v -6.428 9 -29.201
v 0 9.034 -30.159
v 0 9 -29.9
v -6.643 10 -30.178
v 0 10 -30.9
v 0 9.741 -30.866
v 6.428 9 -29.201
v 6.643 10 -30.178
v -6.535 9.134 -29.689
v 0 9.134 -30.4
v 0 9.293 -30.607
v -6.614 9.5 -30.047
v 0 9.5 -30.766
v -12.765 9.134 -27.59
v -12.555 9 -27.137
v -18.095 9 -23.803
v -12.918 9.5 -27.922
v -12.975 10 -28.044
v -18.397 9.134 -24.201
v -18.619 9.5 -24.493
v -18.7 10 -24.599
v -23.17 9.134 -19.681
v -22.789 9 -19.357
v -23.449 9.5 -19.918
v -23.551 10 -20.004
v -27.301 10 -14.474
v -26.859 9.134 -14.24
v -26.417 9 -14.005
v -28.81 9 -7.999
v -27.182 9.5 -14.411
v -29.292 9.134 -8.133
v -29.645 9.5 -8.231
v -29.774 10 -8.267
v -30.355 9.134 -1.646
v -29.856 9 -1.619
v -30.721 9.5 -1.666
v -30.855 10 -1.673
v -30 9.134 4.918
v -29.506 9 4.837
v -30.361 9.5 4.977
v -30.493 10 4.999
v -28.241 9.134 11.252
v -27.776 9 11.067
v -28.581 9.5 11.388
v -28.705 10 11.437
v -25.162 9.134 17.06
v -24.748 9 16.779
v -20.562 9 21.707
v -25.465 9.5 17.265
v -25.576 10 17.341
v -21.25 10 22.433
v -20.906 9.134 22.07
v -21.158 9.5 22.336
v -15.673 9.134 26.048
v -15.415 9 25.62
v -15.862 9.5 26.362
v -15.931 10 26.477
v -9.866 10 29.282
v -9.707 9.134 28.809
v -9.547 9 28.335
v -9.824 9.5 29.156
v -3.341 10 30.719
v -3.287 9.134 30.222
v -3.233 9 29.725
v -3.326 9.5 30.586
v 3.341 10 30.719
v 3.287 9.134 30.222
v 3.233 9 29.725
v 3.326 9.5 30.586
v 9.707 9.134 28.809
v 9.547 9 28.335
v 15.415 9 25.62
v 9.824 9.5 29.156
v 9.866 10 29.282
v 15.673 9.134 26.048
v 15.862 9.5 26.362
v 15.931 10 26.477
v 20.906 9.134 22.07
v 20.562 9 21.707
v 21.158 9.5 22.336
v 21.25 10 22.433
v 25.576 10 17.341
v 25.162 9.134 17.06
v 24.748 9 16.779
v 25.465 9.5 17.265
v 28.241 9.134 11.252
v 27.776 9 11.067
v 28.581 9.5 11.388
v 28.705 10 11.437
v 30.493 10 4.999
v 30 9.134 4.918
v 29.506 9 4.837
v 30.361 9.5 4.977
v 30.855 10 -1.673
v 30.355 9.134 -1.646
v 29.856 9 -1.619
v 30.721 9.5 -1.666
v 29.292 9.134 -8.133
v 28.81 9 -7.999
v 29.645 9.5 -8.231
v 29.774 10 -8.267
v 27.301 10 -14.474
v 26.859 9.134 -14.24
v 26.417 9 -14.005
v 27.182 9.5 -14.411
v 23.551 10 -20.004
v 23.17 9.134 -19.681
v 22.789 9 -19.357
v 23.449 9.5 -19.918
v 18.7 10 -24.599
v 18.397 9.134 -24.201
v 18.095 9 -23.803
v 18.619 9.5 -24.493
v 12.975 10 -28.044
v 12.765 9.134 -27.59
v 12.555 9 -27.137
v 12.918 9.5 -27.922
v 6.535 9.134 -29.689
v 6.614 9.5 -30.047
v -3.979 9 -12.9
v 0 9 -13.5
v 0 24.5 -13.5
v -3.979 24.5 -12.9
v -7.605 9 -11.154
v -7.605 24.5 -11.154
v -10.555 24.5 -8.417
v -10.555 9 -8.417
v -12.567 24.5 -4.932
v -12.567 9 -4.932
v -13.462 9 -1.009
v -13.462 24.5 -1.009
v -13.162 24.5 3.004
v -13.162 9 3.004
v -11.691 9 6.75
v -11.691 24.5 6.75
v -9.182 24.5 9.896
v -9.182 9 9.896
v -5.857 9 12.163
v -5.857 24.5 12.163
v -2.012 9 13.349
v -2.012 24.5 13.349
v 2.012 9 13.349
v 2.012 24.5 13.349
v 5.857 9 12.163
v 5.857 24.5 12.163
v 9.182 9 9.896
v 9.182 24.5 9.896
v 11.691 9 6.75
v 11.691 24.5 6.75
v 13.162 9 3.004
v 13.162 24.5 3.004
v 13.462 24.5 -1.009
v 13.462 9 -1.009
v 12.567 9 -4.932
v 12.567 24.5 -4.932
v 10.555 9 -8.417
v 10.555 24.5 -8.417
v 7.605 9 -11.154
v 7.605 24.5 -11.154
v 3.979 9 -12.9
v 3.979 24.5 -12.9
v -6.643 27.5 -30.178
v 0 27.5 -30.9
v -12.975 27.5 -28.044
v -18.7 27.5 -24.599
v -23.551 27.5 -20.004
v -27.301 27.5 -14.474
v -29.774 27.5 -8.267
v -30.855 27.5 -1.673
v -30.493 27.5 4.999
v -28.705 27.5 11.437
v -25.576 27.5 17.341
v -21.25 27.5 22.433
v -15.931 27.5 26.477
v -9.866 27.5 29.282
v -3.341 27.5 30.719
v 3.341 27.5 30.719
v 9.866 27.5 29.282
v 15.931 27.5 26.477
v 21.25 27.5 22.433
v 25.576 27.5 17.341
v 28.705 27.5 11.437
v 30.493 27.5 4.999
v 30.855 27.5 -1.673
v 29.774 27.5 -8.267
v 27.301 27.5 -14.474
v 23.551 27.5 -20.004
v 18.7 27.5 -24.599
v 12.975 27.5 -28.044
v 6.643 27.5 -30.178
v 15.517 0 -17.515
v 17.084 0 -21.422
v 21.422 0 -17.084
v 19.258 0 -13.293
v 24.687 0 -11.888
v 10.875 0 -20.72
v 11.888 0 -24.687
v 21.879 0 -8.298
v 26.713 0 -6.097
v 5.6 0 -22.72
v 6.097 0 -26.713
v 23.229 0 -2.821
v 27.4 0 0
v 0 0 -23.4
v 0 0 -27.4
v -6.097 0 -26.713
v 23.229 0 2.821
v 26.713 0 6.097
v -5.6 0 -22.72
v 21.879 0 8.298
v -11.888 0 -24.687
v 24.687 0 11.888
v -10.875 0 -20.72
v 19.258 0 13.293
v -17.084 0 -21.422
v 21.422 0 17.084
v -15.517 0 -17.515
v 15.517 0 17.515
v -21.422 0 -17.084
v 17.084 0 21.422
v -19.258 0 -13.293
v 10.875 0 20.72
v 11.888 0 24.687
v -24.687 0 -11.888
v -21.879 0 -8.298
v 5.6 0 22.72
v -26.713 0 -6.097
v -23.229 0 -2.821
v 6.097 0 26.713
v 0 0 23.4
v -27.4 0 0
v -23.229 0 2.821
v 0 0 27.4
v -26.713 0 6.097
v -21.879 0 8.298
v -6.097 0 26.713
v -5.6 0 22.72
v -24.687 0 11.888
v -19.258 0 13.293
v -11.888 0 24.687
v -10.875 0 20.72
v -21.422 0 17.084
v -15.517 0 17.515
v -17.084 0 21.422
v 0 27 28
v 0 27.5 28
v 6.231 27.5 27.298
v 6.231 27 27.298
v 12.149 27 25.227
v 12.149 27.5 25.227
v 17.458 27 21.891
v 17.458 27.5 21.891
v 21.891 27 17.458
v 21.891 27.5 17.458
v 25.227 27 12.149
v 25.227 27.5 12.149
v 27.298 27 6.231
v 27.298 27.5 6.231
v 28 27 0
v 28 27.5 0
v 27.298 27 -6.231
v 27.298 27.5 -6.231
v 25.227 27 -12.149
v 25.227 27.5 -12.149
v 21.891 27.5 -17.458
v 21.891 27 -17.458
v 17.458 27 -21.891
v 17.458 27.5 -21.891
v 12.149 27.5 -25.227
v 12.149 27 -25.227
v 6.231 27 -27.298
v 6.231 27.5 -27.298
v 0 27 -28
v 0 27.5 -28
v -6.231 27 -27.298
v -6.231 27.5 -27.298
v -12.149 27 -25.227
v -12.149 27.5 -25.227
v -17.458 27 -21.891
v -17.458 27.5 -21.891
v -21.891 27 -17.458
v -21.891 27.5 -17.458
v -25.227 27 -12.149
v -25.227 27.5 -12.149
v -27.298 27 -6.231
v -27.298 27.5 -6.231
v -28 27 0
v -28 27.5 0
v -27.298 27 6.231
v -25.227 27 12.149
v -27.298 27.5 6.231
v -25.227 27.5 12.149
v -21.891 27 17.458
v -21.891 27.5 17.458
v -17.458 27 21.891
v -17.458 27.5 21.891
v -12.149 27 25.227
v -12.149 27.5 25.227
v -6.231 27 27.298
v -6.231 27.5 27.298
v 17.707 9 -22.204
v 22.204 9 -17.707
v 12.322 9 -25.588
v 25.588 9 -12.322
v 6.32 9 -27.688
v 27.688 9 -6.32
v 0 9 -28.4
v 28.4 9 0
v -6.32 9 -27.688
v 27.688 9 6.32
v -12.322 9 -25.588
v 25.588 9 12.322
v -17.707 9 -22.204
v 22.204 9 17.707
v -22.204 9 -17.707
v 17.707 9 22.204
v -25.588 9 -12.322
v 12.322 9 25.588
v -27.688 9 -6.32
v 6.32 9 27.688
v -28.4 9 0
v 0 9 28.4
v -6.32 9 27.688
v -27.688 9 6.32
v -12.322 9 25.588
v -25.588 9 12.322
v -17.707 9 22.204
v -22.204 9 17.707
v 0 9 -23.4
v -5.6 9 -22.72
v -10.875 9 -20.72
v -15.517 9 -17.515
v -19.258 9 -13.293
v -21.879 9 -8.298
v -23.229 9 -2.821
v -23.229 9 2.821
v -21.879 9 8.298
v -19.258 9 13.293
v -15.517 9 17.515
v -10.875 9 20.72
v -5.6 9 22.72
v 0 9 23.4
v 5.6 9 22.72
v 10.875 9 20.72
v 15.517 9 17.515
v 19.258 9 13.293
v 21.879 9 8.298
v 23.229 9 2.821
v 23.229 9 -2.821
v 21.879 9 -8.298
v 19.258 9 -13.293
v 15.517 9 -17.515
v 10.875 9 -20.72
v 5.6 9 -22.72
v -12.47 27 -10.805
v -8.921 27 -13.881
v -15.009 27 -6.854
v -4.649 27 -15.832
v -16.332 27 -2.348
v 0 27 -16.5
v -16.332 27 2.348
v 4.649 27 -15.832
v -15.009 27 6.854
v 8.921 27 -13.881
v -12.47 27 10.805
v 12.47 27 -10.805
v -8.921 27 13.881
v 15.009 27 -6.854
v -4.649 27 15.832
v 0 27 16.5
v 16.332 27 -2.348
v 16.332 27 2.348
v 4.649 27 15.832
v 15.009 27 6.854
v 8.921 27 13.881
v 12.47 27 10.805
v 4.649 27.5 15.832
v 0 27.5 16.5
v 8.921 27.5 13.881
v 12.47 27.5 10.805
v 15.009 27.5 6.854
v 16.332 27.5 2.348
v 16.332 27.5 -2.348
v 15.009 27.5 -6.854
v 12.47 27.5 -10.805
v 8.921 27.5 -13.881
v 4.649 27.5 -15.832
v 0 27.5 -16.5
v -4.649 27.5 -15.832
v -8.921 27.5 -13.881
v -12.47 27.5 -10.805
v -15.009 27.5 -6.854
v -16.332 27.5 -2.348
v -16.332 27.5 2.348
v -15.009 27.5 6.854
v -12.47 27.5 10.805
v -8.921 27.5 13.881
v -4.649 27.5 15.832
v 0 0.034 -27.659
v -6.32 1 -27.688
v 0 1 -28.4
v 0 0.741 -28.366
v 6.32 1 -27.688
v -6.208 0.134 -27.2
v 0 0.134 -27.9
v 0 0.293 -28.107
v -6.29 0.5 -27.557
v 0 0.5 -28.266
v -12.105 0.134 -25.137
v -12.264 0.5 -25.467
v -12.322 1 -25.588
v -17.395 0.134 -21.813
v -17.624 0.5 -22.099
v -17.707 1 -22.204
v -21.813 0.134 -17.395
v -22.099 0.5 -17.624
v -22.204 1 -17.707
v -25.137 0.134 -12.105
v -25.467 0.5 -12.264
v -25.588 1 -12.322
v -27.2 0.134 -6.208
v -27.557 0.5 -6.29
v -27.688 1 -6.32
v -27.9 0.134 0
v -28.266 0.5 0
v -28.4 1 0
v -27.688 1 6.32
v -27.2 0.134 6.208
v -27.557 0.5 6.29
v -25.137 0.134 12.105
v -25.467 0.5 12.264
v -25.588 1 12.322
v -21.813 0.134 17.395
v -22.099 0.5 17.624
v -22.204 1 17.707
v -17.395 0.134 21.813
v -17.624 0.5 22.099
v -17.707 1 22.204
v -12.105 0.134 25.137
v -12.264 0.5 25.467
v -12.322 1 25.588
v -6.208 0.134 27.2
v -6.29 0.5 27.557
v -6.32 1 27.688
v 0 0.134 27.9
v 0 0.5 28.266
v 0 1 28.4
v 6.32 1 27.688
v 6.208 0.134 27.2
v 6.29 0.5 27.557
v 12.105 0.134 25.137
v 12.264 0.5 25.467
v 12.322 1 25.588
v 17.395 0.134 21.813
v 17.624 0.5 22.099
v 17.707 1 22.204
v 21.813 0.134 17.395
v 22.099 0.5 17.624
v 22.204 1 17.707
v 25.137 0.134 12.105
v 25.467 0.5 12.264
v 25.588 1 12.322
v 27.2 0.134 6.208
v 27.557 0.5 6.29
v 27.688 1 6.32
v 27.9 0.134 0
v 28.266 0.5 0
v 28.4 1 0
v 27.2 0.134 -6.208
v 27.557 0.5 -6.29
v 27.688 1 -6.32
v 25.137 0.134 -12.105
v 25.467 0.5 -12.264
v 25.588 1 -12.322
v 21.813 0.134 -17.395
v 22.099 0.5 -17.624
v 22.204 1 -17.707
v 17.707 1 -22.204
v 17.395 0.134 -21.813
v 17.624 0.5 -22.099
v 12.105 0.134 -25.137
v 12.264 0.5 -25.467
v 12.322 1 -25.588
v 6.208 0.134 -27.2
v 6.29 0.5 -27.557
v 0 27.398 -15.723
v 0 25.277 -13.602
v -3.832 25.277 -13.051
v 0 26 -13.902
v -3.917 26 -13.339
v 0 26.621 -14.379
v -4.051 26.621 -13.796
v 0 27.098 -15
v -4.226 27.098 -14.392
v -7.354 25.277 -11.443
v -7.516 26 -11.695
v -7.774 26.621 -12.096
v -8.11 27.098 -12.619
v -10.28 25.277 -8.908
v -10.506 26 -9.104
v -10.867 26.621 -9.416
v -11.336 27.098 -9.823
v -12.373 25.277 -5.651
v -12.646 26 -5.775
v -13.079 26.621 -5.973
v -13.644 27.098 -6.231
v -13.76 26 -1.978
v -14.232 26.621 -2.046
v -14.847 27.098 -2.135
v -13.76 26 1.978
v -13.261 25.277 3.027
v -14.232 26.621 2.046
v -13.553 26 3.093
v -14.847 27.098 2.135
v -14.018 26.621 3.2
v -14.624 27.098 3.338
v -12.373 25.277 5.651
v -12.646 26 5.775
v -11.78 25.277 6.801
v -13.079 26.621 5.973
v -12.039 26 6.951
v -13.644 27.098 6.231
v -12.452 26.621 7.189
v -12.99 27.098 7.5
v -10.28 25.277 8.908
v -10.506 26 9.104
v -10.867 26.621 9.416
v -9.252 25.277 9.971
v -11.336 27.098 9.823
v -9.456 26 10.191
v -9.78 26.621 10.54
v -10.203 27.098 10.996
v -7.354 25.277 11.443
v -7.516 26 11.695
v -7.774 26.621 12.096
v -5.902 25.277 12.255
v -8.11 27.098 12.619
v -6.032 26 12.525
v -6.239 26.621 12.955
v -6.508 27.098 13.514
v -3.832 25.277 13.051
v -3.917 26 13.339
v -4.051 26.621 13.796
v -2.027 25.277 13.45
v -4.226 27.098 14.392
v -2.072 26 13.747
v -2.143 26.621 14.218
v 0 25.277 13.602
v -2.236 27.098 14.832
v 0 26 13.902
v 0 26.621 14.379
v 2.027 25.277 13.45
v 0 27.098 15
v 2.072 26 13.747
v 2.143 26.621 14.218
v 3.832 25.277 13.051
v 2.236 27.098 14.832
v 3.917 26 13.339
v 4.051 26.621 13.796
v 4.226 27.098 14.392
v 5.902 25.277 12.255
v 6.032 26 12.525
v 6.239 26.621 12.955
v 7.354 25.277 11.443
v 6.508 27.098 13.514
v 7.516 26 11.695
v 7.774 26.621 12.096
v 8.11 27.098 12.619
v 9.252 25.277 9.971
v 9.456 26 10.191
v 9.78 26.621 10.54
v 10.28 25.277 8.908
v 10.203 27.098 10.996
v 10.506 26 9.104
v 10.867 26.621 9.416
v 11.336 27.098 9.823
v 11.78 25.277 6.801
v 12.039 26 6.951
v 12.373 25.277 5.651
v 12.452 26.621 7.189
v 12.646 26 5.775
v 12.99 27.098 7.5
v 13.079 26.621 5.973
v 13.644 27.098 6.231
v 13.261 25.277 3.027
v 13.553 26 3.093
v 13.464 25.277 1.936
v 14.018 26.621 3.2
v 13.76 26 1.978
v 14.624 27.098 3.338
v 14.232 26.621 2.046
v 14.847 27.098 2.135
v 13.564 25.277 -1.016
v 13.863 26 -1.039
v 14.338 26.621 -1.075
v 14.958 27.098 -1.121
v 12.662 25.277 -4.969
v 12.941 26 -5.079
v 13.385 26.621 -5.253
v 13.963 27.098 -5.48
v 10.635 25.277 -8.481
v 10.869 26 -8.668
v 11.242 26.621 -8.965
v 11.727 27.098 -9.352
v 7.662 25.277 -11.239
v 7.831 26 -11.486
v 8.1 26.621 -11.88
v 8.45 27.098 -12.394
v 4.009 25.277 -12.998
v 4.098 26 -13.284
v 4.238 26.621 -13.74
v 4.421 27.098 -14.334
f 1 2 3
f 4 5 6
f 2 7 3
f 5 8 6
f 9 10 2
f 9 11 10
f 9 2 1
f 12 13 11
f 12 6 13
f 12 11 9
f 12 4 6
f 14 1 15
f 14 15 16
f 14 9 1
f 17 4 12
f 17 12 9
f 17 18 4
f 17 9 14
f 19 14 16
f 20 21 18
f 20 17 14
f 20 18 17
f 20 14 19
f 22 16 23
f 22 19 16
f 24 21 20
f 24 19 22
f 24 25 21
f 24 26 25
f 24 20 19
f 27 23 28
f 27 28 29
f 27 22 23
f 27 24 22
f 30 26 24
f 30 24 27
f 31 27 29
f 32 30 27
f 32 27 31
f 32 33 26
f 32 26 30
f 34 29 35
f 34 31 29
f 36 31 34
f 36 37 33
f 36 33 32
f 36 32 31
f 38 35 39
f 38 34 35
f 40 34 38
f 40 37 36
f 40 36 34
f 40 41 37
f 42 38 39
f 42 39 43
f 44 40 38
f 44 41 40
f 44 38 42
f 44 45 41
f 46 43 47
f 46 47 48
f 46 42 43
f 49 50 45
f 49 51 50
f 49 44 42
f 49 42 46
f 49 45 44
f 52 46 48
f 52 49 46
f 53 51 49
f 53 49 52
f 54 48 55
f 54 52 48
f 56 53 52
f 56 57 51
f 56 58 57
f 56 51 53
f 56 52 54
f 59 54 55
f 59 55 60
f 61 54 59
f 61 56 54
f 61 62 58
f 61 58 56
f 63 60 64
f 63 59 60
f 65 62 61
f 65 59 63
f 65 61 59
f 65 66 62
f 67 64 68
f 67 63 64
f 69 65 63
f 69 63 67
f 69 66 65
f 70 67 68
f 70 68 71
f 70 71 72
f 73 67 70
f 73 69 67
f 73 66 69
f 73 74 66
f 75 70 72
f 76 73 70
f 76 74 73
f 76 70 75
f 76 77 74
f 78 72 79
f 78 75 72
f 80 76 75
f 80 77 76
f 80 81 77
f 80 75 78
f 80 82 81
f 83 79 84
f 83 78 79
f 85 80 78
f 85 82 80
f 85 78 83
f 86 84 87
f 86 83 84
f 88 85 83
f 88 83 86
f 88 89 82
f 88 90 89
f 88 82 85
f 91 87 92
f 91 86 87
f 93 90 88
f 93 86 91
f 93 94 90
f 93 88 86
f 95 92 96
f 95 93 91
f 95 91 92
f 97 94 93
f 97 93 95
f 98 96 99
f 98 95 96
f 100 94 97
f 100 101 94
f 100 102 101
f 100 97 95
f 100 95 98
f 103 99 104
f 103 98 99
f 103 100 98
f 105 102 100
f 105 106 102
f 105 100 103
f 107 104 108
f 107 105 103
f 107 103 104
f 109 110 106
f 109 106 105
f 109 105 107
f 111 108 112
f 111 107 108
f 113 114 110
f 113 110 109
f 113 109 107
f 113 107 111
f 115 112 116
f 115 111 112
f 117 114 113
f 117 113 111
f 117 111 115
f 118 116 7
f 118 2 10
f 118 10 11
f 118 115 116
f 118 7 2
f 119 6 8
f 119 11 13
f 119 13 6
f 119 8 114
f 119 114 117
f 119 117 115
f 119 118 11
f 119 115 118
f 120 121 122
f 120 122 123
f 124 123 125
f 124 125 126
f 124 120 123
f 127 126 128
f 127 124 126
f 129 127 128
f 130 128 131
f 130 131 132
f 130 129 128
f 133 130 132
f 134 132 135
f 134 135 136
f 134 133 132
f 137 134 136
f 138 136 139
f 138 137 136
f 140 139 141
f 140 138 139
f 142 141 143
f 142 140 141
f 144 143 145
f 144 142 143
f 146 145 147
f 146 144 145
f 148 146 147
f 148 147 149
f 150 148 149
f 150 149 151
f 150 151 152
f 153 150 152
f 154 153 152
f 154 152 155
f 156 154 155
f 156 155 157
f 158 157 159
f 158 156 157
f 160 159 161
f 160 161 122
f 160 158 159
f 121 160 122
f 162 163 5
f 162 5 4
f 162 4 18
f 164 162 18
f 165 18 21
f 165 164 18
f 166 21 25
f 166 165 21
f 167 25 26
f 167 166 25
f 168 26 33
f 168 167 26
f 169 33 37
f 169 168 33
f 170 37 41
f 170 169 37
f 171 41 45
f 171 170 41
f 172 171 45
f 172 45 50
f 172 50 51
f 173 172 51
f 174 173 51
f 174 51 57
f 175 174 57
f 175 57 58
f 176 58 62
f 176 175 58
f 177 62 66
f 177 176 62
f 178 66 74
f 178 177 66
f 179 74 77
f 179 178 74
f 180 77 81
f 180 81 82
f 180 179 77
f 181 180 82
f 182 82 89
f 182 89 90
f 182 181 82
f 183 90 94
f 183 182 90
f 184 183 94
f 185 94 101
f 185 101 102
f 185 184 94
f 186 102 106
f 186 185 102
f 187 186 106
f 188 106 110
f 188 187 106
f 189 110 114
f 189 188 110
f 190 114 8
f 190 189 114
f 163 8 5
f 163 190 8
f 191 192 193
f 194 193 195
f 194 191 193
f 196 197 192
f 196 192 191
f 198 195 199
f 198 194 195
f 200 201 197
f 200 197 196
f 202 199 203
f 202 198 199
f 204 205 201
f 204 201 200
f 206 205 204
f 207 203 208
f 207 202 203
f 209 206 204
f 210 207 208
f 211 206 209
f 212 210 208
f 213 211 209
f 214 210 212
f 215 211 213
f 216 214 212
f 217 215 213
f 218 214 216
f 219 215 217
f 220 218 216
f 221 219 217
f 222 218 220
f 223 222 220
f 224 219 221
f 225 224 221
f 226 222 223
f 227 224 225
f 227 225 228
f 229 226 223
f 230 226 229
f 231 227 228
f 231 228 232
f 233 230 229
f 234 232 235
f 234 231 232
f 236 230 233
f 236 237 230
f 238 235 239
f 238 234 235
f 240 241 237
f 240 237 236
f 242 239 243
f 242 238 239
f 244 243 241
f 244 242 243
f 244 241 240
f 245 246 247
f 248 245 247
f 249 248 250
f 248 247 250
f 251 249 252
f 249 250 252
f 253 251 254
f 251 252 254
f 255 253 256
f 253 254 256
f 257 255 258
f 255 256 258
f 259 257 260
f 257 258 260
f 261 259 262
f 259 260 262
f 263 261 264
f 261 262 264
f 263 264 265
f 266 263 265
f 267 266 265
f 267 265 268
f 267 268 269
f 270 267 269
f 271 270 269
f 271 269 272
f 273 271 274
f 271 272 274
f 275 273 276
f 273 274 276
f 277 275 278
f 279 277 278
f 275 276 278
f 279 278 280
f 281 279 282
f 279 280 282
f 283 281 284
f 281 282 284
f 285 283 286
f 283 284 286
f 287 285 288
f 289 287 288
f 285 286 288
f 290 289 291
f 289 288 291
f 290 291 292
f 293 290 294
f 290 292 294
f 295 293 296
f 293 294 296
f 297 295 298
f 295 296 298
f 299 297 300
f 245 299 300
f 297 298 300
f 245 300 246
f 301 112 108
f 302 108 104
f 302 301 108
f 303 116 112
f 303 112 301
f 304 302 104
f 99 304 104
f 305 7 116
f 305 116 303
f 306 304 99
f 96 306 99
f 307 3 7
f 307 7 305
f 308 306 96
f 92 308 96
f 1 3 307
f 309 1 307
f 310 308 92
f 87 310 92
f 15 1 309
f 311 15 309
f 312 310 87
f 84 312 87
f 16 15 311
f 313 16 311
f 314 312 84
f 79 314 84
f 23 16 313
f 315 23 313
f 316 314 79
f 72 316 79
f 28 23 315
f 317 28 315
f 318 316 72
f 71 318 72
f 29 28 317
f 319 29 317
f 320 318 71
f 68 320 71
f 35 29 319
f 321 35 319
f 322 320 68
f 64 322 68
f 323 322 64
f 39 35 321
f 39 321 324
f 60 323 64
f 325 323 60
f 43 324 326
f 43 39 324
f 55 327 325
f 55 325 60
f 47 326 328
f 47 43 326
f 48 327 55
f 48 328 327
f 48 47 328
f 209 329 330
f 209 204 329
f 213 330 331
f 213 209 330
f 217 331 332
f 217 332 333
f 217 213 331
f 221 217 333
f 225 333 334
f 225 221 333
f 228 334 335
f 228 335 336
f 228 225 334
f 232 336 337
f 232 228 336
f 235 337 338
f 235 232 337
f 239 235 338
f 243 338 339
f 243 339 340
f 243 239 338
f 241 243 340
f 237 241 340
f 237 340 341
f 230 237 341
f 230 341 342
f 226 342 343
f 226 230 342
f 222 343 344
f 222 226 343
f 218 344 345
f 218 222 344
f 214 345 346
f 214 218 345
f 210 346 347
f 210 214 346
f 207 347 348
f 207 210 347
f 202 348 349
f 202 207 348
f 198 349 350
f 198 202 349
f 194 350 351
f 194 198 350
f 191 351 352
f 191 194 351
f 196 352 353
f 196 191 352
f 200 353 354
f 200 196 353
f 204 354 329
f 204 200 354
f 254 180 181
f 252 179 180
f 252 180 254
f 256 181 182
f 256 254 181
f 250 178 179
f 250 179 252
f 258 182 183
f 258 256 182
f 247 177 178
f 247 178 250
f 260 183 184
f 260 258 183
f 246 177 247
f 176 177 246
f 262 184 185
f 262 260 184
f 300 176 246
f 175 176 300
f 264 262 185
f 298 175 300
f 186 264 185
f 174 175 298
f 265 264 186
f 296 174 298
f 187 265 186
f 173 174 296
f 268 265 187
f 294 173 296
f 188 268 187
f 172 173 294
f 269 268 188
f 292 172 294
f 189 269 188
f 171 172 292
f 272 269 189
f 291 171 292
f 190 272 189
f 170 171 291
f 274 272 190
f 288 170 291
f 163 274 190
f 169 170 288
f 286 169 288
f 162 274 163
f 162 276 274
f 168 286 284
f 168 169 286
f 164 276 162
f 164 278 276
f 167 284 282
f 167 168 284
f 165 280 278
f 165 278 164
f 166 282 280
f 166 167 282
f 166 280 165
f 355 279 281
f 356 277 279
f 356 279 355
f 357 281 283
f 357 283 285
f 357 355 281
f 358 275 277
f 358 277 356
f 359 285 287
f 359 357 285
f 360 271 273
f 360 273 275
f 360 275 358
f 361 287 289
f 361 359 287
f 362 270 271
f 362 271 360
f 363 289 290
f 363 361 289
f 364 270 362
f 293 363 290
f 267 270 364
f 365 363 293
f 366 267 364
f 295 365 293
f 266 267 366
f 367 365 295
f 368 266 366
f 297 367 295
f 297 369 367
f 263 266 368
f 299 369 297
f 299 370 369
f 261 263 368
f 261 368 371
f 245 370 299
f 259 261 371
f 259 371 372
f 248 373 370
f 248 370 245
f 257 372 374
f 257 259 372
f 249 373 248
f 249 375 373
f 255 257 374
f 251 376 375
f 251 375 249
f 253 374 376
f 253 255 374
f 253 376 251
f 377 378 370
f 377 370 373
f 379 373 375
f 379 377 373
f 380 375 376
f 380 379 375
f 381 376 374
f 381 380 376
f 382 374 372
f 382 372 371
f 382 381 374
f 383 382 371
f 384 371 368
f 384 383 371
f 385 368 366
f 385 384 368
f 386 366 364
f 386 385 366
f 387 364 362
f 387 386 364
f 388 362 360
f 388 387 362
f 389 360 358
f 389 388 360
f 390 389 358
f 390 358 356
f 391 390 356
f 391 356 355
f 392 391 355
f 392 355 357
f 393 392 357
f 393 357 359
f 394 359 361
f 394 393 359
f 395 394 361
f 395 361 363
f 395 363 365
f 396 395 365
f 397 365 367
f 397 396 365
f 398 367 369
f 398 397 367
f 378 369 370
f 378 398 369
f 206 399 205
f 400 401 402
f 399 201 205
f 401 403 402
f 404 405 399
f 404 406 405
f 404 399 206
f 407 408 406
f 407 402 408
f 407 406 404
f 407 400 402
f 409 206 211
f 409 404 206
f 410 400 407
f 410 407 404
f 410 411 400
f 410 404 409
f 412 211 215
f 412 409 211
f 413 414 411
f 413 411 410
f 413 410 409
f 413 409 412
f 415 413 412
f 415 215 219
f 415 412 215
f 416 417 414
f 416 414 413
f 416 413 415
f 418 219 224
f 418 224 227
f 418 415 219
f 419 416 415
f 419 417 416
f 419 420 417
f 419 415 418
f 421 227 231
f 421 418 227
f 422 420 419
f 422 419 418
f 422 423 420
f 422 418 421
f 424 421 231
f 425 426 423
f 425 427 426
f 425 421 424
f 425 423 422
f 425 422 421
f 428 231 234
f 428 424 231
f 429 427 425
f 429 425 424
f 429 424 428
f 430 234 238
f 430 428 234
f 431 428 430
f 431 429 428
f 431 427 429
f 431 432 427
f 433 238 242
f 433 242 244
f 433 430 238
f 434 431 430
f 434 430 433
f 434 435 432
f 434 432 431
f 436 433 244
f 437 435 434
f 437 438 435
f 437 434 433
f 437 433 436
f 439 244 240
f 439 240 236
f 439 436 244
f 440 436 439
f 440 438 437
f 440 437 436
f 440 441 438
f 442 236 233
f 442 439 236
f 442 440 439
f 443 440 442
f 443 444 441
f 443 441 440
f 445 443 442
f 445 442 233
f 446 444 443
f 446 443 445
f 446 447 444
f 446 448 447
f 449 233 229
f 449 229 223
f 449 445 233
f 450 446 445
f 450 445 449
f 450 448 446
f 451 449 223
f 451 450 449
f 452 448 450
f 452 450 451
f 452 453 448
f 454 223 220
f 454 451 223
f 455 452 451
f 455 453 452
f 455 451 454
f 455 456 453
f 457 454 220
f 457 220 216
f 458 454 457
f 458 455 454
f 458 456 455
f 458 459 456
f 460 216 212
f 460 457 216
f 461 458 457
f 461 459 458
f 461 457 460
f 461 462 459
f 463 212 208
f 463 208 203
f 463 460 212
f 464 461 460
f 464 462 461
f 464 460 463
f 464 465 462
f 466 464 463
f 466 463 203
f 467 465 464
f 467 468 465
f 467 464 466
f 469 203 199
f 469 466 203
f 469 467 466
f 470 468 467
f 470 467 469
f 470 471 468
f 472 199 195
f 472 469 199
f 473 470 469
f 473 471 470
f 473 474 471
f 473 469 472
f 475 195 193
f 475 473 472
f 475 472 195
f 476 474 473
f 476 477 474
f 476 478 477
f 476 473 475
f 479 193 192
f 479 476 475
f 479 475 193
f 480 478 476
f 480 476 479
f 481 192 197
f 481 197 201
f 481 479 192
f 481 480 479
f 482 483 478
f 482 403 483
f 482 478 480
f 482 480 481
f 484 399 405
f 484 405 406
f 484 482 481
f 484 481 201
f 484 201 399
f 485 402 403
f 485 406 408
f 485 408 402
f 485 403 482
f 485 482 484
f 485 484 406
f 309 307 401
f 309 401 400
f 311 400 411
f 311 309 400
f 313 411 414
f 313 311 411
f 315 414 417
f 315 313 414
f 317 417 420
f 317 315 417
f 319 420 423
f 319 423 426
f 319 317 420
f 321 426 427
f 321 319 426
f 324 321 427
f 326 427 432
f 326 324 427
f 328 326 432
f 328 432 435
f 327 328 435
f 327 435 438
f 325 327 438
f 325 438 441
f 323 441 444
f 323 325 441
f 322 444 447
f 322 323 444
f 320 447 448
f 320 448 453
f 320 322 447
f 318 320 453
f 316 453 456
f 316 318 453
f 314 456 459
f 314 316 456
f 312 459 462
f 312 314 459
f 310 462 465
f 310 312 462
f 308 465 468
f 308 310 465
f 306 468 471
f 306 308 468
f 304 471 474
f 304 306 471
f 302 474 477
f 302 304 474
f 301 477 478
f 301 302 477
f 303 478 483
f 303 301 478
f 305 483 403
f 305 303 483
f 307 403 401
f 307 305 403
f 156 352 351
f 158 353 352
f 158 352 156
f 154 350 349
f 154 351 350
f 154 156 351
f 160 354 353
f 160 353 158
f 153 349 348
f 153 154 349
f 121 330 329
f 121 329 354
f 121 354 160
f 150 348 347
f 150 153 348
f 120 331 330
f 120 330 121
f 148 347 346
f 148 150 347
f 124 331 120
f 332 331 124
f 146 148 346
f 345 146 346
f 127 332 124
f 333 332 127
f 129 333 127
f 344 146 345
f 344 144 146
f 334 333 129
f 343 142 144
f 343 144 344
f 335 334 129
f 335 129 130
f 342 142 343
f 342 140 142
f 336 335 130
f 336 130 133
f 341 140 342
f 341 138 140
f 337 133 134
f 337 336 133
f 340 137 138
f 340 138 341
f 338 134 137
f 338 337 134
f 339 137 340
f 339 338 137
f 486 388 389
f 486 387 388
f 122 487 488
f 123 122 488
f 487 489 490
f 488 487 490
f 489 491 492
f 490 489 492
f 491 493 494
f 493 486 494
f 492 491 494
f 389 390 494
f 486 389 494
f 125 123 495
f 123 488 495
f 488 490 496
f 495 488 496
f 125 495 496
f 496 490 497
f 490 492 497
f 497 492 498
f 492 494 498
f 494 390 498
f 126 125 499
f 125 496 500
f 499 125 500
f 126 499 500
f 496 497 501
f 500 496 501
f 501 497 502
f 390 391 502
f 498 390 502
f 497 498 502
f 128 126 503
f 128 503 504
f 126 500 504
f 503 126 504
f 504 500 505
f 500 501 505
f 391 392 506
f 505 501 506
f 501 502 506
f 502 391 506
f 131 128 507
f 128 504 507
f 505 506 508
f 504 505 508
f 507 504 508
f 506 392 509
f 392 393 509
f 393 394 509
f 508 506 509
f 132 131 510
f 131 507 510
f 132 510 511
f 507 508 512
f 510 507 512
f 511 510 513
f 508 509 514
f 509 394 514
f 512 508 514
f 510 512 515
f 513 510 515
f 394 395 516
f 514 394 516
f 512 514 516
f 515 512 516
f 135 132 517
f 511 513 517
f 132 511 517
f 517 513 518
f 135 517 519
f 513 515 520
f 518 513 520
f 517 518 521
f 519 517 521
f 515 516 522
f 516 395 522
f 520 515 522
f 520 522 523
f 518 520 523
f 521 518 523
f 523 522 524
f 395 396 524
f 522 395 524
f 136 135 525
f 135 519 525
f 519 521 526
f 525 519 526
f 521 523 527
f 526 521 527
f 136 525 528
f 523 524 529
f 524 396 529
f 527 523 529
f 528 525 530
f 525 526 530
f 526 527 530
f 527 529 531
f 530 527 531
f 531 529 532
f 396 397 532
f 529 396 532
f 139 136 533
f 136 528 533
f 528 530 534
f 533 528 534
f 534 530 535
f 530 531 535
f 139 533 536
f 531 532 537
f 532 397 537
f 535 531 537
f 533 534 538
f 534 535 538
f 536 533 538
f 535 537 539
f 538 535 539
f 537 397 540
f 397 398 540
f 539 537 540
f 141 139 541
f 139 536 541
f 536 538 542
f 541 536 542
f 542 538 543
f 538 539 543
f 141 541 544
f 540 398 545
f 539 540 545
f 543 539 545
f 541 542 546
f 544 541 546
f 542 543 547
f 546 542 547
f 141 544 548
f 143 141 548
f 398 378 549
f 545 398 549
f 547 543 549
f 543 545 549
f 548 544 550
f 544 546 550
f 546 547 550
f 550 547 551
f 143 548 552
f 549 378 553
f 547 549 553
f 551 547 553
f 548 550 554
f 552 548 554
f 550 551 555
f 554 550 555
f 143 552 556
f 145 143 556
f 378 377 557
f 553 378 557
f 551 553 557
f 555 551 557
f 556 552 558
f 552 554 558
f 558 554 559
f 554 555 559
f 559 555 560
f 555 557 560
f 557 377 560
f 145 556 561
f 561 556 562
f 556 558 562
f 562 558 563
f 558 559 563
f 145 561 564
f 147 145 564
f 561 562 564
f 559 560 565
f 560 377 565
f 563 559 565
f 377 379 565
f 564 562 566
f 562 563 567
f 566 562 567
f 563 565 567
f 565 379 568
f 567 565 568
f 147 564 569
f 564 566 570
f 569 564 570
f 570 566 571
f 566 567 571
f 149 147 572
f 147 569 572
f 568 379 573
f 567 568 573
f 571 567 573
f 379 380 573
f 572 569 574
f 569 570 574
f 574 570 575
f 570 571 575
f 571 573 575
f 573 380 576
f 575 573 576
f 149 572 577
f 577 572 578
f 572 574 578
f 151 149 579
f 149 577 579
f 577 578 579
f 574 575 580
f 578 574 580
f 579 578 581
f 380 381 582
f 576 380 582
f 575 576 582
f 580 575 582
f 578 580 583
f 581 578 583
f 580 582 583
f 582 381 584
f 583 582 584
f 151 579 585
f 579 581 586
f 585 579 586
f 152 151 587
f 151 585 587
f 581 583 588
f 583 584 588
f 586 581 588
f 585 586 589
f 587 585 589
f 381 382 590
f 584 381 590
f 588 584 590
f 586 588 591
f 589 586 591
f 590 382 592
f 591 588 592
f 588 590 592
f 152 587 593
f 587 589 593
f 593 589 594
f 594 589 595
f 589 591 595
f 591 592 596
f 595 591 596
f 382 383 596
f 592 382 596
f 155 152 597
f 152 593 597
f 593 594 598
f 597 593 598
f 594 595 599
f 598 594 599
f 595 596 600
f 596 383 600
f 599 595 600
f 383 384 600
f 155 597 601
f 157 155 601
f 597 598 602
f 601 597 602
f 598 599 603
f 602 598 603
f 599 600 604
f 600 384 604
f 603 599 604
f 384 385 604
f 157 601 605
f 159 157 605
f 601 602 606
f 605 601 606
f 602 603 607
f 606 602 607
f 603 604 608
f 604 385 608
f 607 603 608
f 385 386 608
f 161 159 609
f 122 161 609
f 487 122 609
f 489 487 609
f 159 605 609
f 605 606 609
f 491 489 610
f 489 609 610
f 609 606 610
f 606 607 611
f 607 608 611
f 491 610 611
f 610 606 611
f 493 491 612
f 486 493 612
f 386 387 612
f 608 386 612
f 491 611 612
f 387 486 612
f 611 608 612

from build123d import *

# Parameters (mm, degrees)
FILLET_1_R          = 1
SKETCH_4_R          = 28
SKETCH_4_R_2        = 16.5
CUT_EXTRUDE_1_DEPTH = 0.5
FILLET_2_R          = 3


with BuildPart() as part:
    # Эскиз3 → Повернуть2 (revolve)
    with BuildSketch(Plane.XY, mode=Mode.PRIVATE) as revolve_2_sk:
        Polygon((23.4, 0), (28.4, 0), (28.4, 9), (30.9, 9), (30.9, 27.5), (13.5, 27.5), (13.5, 9), (23.4, 9), align=None)
    revolve(revolve_2_sk.sketch.rotate(Axis((0, 0, 0), (0, 1, 0)), 90), axis=Axis((0, 0, 0), (0, 1, 0)))

    # Скругление1
    fillet_1_edges = [part.edges().sort_by_distance(p)[0] for p in [
        (0, 9, 30.9),
        (0, 0, 28.4),
    ]]
    fillet(fillet_1_edges, radius=FILLET_1_R)

    # Эскиз4 → Вырез-Вытянуть1 (cut)
    with BuildSketch(Plane(origin=(0, 27.5, 0), x_dir=(1, 0, 0), z_dir=(0, 1, 0))):
        with Locations(Location((0, 0, 0), (0, 0, 270))):
            Circle(SKETCH_4_R)
        with Locations(Location((0, 0, 0), (0, 0, 270))):
            Circle(SKETCH_4_R_2, mode=Mode.SUBTRACT)
    extrude(amount=-CUT_EXTRUDE_1_DEPTH, mode=Mode.SUBTRACT)

    # Скругление2
    fillet_2_edges = [part.edges().sort_by_distance(p)[0] for p in [
        (0, 27.5, 13.5),
    ]]
    fillet(fillet_2_edges, radius=FILLET_2_R - 0.0001)  # a hair under: the kernel refuses the full size


solid = part.part
